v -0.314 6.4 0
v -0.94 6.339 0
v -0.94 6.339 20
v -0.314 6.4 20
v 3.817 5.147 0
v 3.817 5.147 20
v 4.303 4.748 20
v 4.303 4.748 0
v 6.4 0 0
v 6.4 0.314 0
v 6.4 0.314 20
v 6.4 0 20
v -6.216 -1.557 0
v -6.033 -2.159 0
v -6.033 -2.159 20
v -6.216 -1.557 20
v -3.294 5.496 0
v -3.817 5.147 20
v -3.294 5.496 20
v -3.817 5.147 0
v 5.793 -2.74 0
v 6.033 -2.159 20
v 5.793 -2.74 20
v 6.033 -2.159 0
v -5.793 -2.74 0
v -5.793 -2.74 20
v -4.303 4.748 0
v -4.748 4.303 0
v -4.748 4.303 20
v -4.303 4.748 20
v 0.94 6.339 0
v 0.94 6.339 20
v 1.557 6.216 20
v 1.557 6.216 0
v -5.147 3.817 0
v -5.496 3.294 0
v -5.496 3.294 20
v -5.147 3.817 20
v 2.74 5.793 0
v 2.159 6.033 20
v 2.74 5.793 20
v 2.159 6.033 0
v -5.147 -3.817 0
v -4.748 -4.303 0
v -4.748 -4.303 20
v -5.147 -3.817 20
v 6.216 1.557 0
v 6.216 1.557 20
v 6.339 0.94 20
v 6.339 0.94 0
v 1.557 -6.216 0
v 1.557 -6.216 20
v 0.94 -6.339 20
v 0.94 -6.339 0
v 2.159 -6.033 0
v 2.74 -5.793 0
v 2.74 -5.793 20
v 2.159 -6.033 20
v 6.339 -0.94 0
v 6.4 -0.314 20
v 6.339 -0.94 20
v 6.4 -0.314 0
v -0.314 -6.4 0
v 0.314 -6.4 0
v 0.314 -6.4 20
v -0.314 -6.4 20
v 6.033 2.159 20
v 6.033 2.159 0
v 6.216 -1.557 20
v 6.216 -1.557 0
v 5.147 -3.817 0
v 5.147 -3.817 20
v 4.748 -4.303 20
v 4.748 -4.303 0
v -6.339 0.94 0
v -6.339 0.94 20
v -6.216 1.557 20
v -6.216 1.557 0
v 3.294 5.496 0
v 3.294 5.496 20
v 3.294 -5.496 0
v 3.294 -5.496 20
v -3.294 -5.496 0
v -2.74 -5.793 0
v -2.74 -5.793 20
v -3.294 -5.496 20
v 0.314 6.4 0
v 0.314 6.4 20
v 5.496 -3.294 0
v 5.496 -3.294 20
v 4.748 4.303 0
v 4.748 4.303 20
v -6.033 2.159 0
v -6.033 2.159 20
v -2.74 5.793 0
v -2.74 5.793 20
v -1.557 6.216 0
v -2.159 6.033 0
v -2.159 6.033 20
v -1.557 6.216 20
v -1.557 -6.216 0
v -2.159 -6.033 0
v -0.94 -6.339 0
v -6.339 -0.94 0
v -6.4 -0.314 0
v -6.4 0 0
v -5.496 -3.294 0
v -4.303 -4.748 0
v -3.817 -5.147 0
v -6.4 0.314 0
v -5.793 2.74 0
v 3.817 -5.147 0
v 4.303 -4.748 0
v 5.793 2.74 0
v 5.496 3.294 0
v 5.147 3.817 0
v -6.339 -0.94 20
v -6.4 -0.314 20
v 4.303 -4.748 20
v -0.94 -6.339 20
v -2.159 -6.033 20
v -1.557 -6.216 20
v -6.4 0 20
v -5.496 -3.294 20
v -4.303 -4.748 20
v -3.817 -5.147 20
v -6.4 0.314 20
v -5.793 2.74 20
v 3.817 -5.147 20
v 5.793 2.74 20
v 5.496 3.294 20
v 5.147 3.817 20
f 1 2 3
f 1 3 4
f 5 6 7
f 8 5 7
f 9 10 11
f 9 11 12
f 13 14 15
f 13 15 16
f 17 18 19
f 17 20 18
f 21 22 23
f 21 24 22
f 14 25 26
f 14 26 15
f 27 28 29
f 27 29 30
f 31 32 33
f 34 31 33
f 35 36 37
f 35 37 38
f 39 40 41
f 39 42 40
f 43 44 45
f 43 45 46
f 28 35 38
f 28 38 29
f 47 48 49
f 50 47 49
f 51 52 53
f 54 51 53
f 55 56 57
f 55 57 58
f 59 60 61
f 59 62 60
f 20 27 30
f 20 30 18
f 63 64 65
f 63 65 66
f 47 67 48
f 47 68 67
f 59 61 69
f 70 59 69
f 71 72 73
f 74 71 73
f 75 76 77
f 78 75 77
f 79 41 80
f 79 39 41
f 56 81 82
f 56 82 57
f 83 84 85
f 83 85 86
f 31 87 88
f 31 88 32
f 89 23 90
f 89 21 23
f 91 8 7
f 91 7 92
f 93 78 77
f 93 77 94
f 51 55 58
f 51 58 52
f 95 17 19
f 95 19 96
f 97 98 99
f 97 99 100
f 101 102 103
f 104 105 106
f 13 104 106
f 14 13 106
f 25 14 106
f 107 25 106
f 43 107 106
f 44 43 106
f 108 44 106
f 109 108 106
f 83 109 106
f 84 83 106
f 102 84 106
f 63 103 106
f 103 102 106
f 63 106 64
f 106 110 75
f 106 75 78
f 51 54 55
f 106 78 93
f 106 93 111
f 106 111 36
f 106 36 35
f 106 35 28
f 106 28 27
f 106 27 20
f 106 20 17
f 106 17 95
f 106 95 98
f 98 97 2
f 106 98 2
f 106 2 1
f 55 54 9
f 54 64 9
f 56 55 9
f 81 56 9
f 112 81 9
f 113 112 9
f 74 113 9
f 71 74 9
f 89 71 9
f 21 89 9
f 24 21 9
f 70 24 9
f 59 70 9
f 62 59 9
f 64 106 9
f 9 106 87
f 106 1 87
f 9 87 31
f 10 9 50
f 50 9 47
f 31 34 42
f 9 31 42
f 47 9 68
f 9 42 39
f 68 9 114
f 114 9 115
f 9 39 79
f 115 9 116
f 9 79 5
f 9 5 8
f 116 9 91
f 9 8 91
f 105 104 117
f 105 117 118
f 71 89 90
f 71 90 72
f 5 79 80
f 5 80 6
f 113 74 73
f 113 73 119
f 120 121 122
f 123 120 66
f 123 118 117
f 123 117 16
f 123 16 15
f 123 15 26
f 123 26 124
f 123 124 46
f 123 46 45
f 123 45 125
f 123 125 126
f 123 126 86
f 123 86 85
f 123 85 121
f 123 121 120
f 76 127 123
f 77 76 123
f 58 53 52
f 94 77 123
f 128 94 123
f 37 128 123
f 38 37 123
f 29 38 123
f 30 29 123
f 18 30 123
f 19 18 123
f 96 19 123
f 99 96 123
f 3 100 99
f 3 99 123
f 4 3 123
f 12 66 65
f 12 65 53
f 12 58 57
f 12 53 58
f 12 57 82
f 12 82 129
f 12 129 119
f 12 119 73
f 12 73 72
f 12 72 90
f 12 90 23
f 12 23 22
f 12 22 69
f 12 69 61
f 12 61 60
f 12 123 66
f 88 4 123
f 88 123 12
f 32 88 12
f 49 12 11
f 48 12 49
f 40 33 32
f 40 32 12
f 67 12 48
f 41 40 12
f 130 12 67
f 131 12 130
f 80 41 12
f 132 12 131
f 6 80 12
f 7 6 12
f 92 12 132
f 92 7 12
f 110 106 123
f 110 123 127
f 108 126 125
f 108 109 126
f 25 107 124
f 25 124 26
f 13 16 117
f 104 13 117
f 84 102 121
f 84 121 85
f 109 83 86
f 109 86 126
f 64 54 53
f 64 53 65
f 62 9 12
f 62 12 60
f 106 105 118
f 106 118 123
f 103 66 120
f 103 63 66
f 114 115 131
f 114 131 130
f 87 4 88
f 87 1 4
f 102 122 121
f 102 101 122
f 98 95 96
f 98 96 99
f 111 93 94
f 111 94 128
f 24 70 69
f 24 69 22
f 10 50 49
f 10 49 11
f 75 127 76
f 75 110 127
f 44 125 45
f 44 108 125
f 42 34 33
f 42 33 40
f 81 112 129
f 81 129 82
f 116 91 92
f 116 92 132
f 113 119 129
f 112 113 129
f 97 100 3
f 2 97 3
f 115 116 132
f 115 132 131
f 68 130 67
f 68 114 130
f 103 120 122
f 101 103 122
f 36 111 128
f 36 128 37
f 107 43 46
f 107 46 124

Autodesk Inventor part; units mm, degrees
ref_plane "YZ Plane" through (0, 0, 0) normal (1, 0, 0) x (0, 1, 0)
ref_plane "XZ Plane" through (0, 0, 0) normal (0, 1, 0) x (-1, 0, 0)
ref_plane "XY Plane" through (0, 0, 0) normal (0, 0, 1) x (1, 0, 0)
sketch "C12,5-5, 470uF_126" plane through (0, 0, 0) normal (0, 0, 1) x (1, 0, 0)
  line L0 (0.9403, 6.3386) -> (1.557, 6.216)
  line L1 (1.557, 6.216) -> (2.1588, 6.0334)
  line L2 (2.1588, 6.0334) -> (2.7398, 5.7928)
  line L3 (2.7398, 5.7928) -> (3.2944, 5.4963)
  line L4 (3.2944, 5.4963) -> (3.8172, 5.147)
  line L5 (3.8172, 5.147) -> (4.3033, 4.748)
  line L6 (4.3033, 4.748) -> (4.748, 4.3034)
  line L7 (4.748, 4.3034) -> (5.147, 3.8172)
  line L8 (5.147, 3.8172) -> (5.4963, 3.2944)
  line L9 (5.4963, 3.2944) -> (5.7928, 2.7398)
  line L10 (5.7928, 2.7398) -> (6.0334, 2.1588)
  line L11 (6.0334, 2.1588) -> (6.216, 1.557)
  line L12 (6.216, 1.557) -> (6.3386, 0.9403)
  line L13 (6.3386, 0.9403) -> (6.4003, 0.3144)
  line L14 (6.4003, 0.3144) -> (6.4003, 0)
  line L15 (6.4003, 0) -> (6.4003, -0.3144)
  line L16 (6.4003, -0.3144) -> (6.3386, -0.9403)
  line L17 (6.3386, -0.9403) -> (6.216, -1.557)
  line L18 (6.216, -1.557) -> (6.0334, -2.1588)
  line L19 (6.0334, -2.1588) -> (5.7928, -2.7398)
  line L20 (5.7928, -2.7398) -> (5.4963, -3.2944)
  line L21 (5.4963, -3.2944) -> (5.147, -3.8172)
  line L22 (5.147, -3.8172) -> (4.748, -4.3033)
  line L23 (4.748, -4.3033) -> (4.3033, -4.748)
  line L24 (4.3033, -4.748) -> (3.8172, -5.147)
  line L25 (3.8172, -5.147) -> (3.2944, -5.4963)
  line L26 (3.2944, -5.4963) -> (2.7398, -5.7928)
  line L27 (2.7398, -5.7928) -> (2.1588, -6.0334)
  line L28 (2.1588, -6.0334) -> (1.557, -6.216)
  line L29 (1.557, -6.216) -> (0.9403, -6.3386)
  line L30 (0.9403, -6.3386) -> (0.3144, -6.4003)
  line L31 (0.3144, -6.4003) -> (-0.3144, -6.4003)
  line L32 (-0.3144, -6.4003) -> (-0.9403, -6.3386)
  line L33 (-0.9403, -6.3386) -> (-1.557, -6.216)
  line L34 (-1.557, -6.216) -> (-2.1588, -6.0334)
  line L35 (-2.1588, -6.0334) -> (-2.7398, -5.7928)
  line L36 (-2.7398, -5.7928) -> (-3.2944, -5.4963)
  line L37 (-3.2944, -5.4963) -> (-3.8172, -5.147)
  line L38 (-3.8172, -5.147) -> (-4.3034, -4.748)
  line L39 (-4.3034, -4.748) -> (-4.748, -4.3033)
  line L40 (-4.748, -4.3033) -> (-5.147, -3.8172)
  line L41 (-5.147, -3.8172) -> (-5.4963, -3.2944)
  line L42 (-5.4963, -3.2944) -> (-5.7928, -2.7398)
  line L43 (-5.7928, -2.7398) -> (-6.0334, -2.1588)
  line L44 (-6.0334, -2.1588) -> (-6.216, -1.557)
  line L45 (-6.216, -1.557) -> (-6.3386, -0.9403)
  line L46 (-6.3386, -0.9403) -> (-6.4003, -0.3144)
  line L47 (-6.4003, -0.3144) -> (-6.4003, 0)
  line L48 (-6.4003, 0) -> (-6.4003, 0.3144)
  line L49 (-6.4003, 0.3144) -> (-6.3386, 0.9403)
  line L50 (-6.3386, 0.9403) -> (-6.216, 1.557)
  line L51 (-6.216, 1.557) -> (-6.0334, 2.1588)
  line L52 (-6.0334, 2.1588) -> (-5.7928, 2.7398)
  line L53 (-5.7928, 2.7398) -> (-5.4963, 3.2944)
  line L54 (-5.4963, 3.2944) -> (-5.147, 3.8172)
  line L55 (-5.147, 3.8172) -> (-4.748, 4.3034)
  line L56 (-4.748, 4.3034) -> (-4.3034, 4.748)
  line L57 (-4.3034, 4.748) -> (-3.8172, 5.147)
  line L58 (-3.8172, 5.147) -> (-3.2944, 5.4963)
  line L59 (-3.2944, 5.4963) -> (-2.7398, 5.7928)
  line L60 (-2.7398, 5.7928) -> (-2.1588, 6.0334)
  line L61 (-2.1588, 6.0334) -> (-1.557, 6.216)
  line L62 (-1.557, 6.216) -> (-0.9403, 6.3386)
  line L63 (-0.9403, 6.3386) -> (-0.3144, 6.4003)
  line L64 (-0.3144, 6.4003) -> (0.3144, 6.4003)
  line L65 (0.3144, 6.4003) -> (0.9403, 6.3386)
extrude "Extrusion1" add sketch "C12,5-5, 470uF_126" along normal blind 20
properties part number "470uF"
